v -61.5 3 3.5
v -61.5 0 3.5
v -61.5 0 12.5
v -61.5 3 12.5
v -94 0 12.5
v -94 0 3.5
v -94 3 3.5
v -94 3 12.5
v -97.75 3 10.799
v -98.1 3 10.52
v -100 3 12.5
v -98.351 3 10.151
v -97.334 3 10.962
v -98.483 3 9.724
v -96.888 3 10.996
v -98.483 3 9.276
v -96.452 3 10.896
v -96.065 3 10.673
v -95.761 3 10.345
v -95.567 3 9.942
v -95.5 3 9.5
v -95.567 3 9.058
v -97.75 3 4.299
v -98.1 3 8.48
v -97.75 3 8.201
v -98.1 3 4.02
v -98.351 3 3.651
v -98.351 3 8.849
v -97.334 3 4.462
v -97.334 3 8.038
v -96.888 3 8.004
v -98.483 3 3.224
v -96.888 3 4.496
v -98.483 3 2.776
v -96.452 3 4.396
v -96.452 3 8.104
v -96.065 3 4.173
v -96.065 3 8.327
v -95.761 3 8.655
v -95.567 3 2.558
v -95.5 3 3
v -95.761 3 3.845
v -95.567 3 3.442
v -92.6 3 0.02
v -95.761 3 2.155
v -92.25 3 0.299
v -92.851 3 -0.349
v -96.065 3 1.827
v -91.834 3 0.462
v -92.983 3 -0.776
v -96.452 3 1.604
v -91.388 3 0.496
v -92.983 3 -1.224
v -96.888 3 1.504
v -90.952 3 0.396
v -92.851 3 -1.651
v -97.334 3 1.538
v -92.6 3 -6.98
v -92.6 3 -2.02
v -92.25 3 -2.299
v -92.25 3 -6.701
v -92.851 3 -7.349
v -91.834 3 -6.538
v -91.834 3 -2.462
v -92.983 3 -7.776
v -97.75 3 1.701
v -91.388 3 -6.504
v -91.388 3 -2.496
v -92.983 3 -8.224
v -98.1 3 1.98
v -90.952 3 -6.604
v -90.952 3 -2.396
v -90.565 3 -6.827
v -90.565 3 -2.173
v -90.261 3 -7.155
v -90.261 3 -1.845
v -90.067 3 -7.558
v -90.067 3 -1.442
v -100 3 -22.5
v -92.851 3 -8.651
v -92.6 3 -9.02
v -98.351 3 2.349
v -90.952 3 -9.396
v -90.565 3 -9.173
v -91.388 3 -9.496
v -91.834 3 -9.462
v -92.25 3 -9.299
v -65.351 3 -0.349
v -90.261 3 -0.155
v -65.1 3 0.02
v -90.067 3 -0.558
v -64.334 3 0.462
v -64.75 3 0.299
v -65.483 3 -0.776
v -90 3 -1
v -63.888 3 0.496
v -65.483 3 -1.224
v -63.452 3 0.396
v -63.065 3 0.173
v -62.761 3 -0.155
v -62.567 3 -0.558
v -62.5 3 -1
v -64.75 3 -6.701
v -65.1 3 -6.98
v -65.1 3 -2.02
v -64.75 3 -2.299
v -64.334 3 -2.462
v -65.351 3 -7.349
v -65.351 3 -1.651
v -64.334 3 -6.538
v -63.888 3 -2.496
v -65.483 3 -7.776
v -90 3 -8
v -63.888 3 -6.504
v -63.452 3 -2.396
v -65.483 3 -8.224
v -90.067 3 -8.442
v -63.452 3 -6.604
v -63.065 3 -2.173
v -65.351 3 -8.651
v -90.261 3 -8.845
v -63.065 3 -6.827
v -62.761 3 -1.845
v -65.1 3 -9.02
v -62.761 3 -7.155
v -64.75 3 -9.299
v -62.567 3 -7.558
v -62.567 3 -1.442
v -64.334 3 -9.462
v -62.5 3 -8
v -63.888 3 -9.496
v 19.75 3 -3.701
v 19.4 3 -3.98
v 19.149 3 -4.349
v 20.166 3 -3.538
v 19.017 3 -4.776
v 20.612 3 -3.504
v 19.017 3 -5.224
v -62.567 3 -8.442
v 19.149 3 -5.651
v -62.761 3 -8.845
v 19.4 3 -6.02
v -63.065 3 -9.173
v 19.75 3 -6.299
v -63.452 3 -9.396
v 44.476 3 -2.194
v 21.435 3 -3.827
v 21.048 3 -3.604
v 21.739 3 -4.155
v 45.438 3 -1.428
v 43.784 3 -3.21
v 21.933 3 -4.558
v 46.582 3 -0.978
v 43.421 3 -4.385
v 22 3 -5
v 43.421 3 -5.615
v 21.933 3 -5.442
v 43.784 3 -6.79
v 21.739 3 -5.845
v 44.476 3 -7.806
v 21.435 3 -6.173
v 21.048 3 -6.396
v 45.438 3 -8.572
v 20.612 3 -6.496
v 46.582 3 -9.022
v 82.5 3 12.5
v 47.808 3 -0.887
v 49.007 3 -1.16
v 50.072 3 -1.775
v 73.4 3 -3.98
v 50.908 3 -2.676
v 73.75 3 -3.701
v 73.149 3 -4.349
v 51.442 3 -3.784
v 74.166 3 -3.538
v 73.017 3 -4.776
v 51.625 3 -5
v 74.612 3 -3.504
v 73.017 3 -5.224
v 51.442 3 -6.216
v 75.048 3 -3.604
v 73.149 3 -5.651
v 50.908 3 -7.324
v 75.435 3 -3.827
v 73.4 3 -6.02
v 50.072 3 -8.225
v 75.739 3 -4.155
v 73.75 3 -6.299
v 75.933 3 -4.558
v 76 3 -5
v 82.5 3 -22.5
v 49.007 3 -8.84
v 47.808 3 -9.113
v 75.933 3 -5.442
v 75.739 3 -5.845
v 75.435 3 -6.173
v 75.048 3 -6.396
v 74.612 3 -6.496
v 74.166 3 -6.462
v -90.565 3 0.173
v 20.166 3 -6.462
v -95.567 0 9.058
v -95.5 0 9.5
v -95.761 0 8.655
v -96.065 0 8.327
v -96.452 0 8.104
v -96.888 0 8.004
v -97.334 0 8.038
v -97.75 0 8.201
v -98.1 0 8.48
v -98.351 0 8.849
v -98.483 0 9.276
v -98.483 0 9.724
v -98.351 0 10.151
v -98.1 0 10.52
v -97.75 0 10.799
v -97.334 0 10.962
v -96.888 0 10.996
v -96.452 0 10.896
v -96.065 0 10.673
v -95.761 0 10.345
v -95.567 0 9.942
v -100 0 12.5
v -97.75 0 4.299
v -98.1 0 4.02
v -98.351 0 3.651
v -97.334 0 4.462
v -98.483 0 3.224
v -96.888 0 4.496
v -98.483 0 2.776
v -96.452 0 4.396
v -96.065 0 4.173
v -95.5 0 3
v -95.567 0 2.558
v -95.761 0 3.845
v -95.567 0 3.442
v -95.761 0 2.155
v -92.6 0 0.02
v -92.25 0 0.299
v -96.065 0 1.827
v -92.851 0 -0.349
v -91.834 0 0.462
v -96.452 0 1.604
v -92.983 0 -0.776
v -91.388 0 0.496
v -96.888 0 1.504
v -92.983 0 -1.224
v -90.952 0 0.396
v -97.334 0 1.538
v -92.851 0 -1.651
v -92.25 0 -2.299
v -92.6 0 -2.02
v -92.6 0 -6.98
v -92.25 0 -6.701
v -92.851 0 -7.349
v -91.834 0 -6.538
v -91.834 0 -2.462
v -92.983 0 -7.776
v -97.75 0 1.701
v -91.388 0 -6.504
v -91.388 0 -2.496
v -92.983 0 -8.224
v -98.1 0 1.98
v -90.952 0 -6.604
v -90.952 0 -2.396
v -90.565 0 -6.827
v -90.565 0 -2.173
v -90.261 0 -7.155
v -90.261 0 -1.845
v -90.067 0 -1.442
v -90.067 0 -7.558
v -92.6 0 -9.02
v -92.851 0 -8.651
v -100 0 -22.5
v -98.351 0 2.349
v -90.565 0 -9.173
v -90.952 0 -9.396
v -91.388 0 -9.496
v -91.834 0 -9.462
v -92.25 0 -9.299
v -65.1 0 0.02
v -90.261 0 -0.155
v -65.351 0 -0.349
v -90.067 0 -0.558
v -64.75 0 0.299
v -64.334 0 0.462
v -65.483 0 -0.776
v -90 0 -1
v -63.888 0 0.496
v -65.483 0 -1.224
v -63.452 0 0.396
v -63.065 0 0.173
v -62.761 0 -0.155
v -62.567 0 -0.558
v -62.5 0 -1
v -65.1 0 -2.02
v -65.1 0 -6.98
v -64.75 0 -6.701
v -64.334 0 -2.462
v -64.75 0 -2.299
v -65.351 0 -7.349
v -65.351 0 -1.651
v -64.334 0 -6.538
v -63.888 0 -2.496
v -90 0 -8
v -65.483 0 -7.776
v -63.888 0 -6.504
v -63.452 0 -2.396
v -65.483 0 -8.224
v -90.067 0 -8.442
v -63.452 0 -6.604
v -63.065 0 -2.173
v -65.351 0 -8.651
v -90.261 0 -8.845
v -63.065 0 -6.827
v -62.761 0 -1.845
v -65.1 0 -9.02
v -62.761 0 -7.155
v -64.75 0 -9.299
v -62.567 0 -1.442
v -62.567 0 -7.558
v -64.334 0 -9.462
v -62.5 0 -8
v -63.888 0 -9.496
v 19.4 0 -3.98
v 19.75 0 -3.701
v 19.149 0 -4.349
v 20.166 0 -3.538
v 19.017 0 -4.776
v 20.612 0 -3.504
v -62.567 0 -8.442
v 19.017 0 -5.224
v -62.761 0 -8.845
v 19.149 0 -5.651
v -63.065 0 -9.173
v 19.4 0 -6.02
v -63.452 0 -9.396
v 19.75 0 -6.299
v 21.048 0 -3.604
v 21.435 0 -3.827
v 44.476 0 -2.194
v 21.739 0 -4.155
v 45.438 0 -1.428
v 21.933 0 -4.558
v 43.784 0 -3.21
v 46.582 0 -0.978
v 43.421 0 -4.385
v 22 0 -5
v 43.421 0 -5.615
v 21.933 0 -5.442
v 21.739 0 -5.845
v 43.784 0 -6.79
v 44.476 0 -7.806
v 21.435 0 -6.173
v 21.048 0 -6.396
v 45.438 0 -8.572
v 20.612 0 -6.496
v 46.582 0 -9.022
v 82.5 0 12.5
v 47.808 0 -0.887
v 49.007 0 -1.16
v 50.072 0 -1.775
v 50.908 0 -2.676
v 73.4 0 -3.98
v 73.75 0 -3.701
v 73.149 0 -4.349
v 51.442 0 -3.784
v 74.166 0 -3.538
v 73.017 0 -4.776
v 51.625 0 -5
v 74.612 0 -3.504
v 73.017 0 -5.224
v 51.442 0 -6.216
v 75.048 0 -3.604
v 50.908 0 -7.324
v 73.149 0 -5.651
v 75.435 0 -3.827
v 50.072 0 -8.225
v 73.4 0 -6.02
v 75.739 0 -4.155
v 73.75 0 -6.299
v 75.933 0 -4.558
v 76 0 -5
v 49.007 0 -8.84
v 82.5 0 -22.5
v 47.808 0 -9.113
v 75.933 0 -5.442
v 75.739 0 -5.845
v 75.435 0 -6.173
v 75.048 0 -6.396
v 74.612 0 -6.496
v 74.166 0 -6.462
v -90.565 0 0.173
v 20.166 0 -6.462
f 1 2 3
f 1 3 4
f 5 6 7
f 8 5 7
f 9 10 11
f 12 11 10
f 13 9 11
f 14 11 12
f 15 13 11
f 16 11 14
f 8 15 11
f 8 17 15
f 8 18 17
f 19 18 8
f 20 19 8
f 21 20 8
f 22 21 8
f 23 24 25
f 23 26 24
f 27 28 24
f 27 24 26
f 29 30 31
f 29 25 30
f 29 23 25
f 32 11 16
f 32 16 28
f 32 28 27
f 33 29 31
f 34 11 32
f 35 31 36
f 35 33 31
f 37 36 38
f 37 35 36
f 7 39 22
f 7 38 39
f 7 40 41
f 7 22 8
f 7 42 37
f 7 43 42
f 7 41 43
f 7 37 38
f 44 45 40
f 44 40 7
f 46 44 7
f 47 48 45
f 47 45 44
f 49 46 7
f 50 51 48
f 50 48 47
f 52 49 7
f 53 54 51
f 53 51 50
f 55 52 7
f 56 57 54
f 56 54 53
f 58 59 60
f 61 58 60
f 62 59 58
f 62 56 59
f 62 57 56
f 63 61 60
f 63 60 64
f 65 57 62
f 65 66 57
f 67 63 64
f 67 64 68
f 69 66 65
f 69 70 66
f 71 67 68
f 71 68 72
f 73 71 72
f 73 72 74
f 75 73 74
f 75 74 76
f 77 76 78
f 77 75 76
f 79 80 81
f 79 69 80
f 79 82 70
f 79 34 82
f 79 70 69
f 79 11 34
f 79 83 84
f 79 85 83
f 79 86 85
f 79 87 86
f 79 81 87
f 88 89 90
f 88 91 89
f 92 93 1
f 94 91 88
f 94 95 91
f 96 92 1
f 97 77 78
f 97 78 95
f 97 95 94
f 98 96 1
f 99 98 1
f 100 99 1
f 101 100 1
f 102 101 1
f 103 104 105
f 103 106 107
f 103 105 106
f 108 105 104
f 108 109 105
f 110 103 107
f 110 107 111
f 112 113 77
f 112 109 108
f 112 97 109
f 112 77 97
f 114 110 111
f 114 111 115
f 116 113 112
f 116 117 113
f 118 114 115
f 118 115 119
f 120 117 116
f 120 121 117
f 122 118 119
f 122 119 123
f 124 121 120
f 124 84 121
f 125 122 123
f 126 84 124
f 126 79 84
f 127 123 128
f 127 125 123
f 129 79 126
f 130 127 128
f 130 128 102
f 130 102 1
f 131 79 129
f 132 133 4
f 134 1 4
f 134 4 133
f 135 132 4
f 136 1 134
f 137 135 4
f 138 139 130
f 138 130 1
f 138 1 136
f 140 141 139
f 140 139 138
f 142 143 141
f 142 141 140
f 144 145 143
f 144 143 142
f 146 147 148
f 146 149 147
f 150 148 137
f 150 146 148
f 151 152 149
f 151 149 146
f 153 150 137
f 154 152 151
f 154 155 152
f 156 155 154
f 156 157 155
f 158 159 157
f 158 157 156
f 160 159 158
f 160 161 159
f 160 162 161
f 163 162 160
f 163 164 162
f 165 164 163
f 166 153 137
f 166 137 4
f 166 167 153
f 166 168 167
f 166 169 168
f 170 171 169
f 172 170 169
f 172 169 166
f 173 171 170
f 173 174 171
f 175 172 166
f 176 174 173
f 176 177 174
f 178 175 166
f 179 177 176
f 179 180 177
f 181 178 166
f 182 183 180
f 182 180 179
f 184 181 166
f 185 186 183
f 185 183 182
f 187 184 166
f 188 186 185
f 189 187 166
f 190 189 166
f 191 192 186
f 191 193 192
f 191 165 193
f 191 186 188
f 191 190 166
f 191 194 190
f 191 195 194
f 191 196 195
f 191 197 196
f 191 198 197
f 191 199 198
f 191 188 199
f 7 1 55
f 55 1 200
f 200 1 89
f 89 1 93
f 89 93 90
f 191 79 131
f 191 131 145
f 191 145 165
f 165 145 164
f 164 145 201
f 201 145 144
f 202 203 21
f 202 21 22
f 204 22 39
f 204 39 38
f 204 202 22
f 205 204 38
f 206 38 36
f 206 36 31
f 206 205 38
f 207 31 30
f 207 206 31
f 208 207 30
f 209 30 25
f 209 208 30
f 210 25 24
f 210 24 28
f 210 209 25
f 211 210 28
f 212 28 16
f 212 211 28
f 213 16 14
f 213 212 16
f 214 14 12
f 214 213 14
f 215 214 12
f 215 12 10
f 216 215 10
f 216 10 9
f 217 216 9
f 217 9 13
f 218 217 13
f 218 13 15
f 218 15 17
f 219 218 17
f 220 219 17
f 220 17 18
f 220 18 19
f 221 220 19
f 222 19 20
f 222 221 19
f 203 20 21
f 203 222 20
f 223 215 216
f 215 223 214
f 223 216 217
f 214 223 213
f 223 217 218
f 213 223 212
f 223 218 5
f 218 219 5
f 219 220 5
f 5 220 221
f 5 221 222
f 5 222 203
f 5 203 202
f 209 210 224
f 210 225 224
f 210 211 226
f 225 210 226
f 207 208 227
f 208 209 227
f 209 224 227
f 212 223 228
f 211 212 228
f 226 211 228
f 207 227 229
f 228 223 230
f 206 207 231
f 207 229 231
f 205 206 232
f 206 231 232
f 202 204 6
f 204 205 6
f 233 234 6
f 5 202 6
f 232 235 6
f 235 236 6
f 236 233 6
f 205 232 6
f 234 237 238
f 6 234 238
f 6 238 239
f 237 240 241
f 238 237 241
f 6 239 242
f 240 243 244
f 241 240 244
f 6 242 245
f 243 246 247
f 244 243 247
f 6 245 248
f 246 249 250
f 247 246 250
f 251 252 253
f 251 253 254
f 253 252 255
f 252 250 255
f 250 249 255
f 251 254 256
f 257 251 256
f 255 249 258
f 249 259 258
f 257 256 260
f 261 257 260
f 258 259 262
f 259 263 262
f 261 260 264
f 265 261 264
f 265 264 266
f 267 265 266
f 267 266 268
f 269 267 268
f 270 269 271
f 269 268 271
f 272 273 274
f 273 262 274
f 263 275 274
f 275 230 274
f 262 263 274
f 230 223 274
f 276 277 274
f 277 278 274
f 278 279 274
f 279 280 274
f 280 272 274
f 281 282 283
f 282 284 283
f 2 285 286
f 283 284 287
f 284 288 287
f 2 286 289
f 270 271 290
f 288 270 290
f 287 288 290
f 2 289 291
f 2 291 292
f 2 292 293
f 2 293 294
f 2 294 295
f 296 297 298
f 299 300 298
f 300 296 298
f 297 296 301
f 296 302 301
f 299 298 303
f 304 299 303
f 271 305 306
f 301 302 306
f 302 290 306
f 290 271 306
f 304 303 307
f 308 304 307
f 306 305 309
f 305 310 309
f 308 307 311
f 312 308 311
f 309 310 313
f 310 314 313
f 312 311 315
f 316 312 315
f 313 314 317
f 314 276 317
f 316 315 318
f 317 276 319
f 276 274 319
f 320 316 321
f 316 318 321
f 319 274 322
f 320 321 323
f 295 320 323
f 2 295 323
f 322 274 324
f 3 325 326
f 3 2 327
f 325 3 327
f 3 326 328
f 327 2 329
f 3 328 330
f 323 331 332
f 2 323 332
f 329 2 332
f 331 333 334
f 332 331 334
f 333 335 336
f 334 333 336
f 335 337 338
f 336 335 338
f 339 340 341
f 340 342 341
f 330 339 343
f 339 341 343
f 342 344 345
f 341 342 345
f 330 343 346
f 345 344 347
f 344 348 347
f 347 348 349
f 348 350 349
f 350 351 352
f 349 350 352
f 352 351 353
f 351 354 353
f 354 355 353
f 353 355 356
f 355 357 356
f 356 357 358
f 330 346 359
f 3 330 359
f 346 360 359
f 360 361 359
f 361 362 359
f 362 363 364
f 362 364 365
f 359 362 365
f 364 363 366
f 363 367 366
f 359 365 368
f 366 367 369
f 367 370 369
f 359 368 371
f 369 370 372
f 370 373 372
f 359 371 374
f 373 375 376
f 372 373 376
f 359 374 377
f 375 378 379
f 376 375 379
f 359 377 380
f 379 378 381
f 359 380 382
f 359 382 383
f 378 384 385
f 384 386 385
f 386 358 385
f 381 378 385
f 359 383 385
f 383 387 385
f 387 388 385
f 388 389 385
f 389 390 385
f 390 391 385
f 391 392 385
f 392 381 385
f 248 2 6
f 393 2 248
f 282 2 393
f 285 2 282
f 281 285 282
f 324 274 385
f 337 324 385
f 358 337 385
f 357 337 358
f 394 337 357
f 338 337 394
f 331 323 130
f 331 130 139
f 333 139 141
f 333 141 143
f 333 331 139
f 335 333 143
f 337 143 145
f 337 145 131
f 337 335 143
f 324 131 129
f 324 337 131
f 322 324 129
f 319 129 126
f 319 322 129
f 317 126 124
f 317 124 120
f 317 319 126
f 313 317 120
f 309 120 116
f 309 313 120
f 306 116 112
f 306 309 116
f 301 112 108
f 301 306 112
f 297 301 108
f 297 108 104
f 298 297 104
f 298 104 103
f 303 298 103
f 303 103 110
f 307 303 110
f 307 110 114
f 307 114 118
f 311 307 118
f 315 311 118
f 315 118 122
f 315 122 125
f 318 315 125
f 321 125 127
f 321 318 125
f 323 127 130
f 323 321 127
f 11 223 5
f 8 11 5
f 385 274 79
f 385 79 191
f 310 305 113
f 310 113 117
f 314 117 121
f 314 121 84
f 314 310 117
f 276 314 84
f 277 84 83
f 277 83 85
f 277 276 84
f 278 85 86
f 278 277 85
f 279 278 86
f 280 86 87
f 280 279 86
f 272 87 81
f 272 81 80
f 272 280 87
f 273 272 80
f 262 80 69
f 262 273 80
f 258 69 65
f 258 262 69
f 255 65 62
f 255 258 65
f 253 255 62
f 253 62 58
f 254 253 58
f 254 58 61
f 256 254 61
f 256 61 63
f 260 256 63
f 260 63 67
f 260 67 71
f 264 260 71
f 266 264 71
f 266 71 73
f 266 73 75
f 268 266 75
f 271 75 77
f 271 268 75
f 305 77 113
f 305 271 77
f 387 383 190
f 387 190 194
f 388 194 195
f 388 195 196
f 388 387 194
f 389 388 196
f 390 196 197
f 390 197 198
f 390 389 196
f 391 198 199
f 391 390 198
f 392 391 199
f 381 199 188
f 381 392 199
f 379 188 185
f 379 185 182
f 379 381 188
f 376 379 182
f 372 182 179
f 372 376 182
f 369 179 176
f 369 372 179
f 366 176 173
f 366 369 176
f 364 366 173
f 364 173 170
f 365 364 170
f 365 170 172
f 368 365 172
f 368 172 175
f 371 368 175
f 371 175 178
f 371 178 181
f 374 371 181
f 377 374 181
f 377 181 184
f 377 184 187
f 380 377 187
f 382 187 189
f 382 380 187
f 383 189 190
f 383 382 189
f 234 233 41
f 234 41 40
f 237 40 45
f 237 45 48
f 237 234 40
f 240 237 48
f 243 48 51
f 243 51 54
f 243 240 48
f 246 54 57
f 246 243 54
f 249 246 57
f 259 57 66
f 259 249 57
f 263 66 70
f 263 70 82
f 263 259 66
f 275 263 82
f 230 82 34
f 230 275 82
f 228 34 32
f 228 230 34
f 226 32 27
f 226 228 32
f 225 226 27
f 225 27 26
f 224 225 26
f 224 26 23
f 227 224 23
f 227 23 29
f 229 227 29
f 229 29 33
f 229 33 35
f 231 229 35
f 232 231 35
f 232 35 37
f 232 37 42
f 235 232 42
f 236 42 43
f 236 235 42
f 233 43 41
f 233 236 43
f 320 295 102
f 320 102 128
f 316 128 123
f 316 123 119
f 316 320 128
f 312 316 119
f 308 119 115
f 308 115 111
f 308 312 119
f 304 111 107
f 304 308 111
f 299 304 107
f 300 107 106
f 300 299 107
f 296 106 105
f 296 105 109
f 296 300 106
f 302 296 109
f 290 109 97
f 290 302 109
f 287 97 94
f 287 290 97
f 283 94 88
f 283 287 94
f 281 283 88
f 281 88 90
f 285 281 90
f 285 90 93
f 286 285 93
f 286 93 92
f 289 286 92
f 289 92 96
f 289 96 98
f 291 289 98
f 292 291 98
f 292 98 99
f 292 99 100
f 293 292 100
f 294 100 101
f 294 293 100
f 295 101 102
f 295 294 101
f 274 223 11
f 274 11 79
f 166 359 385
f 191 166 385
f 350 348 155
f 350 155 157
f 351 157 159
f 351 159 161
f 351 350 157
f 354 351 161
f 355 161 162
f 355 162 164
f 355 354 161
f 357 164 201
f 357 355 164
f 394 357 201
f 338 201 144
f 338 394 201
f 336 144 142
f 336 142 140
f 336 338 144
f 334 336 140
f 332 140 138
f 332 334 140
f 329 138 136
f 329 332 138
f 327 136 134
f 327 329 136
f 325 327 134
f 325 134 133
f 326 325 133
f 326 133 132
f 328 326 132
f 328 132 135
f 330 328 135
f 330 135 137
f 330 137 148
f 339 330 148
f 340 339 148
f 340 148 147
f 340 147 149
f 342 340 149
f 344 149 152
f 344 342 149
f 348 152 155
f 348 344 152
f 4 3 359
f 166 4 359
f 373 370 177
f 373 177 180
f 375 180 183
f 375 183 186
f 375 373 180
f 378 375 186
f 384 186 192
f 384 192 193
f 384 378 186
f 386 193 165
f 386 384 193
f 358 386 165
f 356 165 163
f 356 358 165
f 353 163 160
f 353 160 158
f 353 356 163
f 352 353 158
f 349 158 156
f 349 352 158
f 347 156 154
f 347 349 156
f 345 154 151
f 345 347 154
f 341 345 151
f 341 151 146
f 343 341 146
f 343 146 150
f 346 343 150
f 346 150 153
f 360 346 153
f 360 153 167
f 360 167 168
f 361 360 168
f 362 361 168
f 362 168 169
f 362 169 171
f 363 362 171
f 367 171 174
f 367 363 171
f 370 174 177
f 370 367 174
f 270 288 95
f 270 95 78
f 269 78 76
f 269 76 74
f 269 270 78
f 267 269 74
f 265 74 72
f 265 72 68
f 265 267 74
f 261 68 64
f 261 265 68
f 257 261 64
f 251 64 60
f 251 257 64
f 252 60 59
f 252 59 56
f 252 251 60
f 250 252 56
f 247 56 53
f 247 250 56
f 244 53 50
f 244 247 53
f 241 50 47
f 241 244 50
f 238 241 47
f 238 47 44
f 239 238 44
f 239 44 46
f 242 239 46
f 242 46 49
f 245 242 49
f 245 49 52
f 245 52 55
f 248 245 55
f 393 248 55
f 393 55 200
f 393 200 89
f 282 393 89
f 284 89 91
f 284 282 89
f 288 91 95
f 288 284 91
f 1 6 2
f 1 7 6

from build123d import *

# Parameters (mm, degrees)
SKETCH1_W           = 182.5
SKETCH1_H           = 35
SKETCH1_R           = 4.125
SKETCH1_R_2         = 1.5
BOSS_EXTRUDE1_DEPTH = 3
CUT_EXTRUDE3_START  = 3.5
SKETCH2_W           = 3
SKETCH2_H           = 9.897866997
SKETCH2_W_2         = 27.5
SKETCH2_W_3         = 2
CUT_EXTRUDE3_DEPTH  = 9


with BuildPart() as part:
    # Sketch1 → Boss-Extrude1 (new body)
    with BuildSketch(Plane(origin=(0, 0, 0), x_dir=(1, 0, 0), z_dir=(0, 1, 0))):
        with Locations((-8.75, 5)):
            Rectangle(SKETCH1_W, SKETCH1_H)
        with Locations((47.5, 5)):
            Circle(SKETCH1_R, mode=Mode.SUBTRACT)
        with Locations((74.5, 5)):
            Circle(SKETCH1_R_2, mode=Mode.SUBTRACT)
        with Locations((20.5, 5)):
            Circle(SKETCH1_R_2, mode=Mode.SUBTRACT)
        with Locations((-97, -9.5)):
            Circle(SKETCH1_R_2, mode=Mode.SUBTRACT)
        with Locations((-97, -3)):
            Circle(SKETCH1_R_2, mode=Mode.SUBTRACT)
        with Locations((-91.5, 8)):
            Circle(SKETCH1_R_2, mode=Mode.SUBTRACT)
        with Locations((-64, 8)):
            Circle(SKETCH1_R_2, mode=Mode.SUBTRACT)
        with Locations((-64, 1)):
            Circle(SKETCH1_R_2, mode=Mode.SUBTRACT)
        with Locations((-91.5, 1)):
            Circle(SKETCH1_R_2, mode=Mode.SUBTRACT)
    extrude(amount=BOSS_EXTRUDE1_DEPTH)

    # Sketch2 → Cut-Extrude3 (cut)
    with BuildSketch(Plane.XY.offset(CUT_EXTRUDE3_START)):
        with Locations((-90.5, 1.550857661)):
            Rectangle(SKETCH2_W, SKETCH2_H)
        with Locations((-75.25, 1.550857661)):
            Rectangle(SKETCH2_W_2, SKETCH2_H)
        with Locations((-93, 1.550857661)):
            Rectangle(SKETCH2_W_3, SKETCH2_H)
    extrude(amount=CUT_EXTRUDE3_DEPTH, mode=Mode.SUBTRACT)


solid = part.part
